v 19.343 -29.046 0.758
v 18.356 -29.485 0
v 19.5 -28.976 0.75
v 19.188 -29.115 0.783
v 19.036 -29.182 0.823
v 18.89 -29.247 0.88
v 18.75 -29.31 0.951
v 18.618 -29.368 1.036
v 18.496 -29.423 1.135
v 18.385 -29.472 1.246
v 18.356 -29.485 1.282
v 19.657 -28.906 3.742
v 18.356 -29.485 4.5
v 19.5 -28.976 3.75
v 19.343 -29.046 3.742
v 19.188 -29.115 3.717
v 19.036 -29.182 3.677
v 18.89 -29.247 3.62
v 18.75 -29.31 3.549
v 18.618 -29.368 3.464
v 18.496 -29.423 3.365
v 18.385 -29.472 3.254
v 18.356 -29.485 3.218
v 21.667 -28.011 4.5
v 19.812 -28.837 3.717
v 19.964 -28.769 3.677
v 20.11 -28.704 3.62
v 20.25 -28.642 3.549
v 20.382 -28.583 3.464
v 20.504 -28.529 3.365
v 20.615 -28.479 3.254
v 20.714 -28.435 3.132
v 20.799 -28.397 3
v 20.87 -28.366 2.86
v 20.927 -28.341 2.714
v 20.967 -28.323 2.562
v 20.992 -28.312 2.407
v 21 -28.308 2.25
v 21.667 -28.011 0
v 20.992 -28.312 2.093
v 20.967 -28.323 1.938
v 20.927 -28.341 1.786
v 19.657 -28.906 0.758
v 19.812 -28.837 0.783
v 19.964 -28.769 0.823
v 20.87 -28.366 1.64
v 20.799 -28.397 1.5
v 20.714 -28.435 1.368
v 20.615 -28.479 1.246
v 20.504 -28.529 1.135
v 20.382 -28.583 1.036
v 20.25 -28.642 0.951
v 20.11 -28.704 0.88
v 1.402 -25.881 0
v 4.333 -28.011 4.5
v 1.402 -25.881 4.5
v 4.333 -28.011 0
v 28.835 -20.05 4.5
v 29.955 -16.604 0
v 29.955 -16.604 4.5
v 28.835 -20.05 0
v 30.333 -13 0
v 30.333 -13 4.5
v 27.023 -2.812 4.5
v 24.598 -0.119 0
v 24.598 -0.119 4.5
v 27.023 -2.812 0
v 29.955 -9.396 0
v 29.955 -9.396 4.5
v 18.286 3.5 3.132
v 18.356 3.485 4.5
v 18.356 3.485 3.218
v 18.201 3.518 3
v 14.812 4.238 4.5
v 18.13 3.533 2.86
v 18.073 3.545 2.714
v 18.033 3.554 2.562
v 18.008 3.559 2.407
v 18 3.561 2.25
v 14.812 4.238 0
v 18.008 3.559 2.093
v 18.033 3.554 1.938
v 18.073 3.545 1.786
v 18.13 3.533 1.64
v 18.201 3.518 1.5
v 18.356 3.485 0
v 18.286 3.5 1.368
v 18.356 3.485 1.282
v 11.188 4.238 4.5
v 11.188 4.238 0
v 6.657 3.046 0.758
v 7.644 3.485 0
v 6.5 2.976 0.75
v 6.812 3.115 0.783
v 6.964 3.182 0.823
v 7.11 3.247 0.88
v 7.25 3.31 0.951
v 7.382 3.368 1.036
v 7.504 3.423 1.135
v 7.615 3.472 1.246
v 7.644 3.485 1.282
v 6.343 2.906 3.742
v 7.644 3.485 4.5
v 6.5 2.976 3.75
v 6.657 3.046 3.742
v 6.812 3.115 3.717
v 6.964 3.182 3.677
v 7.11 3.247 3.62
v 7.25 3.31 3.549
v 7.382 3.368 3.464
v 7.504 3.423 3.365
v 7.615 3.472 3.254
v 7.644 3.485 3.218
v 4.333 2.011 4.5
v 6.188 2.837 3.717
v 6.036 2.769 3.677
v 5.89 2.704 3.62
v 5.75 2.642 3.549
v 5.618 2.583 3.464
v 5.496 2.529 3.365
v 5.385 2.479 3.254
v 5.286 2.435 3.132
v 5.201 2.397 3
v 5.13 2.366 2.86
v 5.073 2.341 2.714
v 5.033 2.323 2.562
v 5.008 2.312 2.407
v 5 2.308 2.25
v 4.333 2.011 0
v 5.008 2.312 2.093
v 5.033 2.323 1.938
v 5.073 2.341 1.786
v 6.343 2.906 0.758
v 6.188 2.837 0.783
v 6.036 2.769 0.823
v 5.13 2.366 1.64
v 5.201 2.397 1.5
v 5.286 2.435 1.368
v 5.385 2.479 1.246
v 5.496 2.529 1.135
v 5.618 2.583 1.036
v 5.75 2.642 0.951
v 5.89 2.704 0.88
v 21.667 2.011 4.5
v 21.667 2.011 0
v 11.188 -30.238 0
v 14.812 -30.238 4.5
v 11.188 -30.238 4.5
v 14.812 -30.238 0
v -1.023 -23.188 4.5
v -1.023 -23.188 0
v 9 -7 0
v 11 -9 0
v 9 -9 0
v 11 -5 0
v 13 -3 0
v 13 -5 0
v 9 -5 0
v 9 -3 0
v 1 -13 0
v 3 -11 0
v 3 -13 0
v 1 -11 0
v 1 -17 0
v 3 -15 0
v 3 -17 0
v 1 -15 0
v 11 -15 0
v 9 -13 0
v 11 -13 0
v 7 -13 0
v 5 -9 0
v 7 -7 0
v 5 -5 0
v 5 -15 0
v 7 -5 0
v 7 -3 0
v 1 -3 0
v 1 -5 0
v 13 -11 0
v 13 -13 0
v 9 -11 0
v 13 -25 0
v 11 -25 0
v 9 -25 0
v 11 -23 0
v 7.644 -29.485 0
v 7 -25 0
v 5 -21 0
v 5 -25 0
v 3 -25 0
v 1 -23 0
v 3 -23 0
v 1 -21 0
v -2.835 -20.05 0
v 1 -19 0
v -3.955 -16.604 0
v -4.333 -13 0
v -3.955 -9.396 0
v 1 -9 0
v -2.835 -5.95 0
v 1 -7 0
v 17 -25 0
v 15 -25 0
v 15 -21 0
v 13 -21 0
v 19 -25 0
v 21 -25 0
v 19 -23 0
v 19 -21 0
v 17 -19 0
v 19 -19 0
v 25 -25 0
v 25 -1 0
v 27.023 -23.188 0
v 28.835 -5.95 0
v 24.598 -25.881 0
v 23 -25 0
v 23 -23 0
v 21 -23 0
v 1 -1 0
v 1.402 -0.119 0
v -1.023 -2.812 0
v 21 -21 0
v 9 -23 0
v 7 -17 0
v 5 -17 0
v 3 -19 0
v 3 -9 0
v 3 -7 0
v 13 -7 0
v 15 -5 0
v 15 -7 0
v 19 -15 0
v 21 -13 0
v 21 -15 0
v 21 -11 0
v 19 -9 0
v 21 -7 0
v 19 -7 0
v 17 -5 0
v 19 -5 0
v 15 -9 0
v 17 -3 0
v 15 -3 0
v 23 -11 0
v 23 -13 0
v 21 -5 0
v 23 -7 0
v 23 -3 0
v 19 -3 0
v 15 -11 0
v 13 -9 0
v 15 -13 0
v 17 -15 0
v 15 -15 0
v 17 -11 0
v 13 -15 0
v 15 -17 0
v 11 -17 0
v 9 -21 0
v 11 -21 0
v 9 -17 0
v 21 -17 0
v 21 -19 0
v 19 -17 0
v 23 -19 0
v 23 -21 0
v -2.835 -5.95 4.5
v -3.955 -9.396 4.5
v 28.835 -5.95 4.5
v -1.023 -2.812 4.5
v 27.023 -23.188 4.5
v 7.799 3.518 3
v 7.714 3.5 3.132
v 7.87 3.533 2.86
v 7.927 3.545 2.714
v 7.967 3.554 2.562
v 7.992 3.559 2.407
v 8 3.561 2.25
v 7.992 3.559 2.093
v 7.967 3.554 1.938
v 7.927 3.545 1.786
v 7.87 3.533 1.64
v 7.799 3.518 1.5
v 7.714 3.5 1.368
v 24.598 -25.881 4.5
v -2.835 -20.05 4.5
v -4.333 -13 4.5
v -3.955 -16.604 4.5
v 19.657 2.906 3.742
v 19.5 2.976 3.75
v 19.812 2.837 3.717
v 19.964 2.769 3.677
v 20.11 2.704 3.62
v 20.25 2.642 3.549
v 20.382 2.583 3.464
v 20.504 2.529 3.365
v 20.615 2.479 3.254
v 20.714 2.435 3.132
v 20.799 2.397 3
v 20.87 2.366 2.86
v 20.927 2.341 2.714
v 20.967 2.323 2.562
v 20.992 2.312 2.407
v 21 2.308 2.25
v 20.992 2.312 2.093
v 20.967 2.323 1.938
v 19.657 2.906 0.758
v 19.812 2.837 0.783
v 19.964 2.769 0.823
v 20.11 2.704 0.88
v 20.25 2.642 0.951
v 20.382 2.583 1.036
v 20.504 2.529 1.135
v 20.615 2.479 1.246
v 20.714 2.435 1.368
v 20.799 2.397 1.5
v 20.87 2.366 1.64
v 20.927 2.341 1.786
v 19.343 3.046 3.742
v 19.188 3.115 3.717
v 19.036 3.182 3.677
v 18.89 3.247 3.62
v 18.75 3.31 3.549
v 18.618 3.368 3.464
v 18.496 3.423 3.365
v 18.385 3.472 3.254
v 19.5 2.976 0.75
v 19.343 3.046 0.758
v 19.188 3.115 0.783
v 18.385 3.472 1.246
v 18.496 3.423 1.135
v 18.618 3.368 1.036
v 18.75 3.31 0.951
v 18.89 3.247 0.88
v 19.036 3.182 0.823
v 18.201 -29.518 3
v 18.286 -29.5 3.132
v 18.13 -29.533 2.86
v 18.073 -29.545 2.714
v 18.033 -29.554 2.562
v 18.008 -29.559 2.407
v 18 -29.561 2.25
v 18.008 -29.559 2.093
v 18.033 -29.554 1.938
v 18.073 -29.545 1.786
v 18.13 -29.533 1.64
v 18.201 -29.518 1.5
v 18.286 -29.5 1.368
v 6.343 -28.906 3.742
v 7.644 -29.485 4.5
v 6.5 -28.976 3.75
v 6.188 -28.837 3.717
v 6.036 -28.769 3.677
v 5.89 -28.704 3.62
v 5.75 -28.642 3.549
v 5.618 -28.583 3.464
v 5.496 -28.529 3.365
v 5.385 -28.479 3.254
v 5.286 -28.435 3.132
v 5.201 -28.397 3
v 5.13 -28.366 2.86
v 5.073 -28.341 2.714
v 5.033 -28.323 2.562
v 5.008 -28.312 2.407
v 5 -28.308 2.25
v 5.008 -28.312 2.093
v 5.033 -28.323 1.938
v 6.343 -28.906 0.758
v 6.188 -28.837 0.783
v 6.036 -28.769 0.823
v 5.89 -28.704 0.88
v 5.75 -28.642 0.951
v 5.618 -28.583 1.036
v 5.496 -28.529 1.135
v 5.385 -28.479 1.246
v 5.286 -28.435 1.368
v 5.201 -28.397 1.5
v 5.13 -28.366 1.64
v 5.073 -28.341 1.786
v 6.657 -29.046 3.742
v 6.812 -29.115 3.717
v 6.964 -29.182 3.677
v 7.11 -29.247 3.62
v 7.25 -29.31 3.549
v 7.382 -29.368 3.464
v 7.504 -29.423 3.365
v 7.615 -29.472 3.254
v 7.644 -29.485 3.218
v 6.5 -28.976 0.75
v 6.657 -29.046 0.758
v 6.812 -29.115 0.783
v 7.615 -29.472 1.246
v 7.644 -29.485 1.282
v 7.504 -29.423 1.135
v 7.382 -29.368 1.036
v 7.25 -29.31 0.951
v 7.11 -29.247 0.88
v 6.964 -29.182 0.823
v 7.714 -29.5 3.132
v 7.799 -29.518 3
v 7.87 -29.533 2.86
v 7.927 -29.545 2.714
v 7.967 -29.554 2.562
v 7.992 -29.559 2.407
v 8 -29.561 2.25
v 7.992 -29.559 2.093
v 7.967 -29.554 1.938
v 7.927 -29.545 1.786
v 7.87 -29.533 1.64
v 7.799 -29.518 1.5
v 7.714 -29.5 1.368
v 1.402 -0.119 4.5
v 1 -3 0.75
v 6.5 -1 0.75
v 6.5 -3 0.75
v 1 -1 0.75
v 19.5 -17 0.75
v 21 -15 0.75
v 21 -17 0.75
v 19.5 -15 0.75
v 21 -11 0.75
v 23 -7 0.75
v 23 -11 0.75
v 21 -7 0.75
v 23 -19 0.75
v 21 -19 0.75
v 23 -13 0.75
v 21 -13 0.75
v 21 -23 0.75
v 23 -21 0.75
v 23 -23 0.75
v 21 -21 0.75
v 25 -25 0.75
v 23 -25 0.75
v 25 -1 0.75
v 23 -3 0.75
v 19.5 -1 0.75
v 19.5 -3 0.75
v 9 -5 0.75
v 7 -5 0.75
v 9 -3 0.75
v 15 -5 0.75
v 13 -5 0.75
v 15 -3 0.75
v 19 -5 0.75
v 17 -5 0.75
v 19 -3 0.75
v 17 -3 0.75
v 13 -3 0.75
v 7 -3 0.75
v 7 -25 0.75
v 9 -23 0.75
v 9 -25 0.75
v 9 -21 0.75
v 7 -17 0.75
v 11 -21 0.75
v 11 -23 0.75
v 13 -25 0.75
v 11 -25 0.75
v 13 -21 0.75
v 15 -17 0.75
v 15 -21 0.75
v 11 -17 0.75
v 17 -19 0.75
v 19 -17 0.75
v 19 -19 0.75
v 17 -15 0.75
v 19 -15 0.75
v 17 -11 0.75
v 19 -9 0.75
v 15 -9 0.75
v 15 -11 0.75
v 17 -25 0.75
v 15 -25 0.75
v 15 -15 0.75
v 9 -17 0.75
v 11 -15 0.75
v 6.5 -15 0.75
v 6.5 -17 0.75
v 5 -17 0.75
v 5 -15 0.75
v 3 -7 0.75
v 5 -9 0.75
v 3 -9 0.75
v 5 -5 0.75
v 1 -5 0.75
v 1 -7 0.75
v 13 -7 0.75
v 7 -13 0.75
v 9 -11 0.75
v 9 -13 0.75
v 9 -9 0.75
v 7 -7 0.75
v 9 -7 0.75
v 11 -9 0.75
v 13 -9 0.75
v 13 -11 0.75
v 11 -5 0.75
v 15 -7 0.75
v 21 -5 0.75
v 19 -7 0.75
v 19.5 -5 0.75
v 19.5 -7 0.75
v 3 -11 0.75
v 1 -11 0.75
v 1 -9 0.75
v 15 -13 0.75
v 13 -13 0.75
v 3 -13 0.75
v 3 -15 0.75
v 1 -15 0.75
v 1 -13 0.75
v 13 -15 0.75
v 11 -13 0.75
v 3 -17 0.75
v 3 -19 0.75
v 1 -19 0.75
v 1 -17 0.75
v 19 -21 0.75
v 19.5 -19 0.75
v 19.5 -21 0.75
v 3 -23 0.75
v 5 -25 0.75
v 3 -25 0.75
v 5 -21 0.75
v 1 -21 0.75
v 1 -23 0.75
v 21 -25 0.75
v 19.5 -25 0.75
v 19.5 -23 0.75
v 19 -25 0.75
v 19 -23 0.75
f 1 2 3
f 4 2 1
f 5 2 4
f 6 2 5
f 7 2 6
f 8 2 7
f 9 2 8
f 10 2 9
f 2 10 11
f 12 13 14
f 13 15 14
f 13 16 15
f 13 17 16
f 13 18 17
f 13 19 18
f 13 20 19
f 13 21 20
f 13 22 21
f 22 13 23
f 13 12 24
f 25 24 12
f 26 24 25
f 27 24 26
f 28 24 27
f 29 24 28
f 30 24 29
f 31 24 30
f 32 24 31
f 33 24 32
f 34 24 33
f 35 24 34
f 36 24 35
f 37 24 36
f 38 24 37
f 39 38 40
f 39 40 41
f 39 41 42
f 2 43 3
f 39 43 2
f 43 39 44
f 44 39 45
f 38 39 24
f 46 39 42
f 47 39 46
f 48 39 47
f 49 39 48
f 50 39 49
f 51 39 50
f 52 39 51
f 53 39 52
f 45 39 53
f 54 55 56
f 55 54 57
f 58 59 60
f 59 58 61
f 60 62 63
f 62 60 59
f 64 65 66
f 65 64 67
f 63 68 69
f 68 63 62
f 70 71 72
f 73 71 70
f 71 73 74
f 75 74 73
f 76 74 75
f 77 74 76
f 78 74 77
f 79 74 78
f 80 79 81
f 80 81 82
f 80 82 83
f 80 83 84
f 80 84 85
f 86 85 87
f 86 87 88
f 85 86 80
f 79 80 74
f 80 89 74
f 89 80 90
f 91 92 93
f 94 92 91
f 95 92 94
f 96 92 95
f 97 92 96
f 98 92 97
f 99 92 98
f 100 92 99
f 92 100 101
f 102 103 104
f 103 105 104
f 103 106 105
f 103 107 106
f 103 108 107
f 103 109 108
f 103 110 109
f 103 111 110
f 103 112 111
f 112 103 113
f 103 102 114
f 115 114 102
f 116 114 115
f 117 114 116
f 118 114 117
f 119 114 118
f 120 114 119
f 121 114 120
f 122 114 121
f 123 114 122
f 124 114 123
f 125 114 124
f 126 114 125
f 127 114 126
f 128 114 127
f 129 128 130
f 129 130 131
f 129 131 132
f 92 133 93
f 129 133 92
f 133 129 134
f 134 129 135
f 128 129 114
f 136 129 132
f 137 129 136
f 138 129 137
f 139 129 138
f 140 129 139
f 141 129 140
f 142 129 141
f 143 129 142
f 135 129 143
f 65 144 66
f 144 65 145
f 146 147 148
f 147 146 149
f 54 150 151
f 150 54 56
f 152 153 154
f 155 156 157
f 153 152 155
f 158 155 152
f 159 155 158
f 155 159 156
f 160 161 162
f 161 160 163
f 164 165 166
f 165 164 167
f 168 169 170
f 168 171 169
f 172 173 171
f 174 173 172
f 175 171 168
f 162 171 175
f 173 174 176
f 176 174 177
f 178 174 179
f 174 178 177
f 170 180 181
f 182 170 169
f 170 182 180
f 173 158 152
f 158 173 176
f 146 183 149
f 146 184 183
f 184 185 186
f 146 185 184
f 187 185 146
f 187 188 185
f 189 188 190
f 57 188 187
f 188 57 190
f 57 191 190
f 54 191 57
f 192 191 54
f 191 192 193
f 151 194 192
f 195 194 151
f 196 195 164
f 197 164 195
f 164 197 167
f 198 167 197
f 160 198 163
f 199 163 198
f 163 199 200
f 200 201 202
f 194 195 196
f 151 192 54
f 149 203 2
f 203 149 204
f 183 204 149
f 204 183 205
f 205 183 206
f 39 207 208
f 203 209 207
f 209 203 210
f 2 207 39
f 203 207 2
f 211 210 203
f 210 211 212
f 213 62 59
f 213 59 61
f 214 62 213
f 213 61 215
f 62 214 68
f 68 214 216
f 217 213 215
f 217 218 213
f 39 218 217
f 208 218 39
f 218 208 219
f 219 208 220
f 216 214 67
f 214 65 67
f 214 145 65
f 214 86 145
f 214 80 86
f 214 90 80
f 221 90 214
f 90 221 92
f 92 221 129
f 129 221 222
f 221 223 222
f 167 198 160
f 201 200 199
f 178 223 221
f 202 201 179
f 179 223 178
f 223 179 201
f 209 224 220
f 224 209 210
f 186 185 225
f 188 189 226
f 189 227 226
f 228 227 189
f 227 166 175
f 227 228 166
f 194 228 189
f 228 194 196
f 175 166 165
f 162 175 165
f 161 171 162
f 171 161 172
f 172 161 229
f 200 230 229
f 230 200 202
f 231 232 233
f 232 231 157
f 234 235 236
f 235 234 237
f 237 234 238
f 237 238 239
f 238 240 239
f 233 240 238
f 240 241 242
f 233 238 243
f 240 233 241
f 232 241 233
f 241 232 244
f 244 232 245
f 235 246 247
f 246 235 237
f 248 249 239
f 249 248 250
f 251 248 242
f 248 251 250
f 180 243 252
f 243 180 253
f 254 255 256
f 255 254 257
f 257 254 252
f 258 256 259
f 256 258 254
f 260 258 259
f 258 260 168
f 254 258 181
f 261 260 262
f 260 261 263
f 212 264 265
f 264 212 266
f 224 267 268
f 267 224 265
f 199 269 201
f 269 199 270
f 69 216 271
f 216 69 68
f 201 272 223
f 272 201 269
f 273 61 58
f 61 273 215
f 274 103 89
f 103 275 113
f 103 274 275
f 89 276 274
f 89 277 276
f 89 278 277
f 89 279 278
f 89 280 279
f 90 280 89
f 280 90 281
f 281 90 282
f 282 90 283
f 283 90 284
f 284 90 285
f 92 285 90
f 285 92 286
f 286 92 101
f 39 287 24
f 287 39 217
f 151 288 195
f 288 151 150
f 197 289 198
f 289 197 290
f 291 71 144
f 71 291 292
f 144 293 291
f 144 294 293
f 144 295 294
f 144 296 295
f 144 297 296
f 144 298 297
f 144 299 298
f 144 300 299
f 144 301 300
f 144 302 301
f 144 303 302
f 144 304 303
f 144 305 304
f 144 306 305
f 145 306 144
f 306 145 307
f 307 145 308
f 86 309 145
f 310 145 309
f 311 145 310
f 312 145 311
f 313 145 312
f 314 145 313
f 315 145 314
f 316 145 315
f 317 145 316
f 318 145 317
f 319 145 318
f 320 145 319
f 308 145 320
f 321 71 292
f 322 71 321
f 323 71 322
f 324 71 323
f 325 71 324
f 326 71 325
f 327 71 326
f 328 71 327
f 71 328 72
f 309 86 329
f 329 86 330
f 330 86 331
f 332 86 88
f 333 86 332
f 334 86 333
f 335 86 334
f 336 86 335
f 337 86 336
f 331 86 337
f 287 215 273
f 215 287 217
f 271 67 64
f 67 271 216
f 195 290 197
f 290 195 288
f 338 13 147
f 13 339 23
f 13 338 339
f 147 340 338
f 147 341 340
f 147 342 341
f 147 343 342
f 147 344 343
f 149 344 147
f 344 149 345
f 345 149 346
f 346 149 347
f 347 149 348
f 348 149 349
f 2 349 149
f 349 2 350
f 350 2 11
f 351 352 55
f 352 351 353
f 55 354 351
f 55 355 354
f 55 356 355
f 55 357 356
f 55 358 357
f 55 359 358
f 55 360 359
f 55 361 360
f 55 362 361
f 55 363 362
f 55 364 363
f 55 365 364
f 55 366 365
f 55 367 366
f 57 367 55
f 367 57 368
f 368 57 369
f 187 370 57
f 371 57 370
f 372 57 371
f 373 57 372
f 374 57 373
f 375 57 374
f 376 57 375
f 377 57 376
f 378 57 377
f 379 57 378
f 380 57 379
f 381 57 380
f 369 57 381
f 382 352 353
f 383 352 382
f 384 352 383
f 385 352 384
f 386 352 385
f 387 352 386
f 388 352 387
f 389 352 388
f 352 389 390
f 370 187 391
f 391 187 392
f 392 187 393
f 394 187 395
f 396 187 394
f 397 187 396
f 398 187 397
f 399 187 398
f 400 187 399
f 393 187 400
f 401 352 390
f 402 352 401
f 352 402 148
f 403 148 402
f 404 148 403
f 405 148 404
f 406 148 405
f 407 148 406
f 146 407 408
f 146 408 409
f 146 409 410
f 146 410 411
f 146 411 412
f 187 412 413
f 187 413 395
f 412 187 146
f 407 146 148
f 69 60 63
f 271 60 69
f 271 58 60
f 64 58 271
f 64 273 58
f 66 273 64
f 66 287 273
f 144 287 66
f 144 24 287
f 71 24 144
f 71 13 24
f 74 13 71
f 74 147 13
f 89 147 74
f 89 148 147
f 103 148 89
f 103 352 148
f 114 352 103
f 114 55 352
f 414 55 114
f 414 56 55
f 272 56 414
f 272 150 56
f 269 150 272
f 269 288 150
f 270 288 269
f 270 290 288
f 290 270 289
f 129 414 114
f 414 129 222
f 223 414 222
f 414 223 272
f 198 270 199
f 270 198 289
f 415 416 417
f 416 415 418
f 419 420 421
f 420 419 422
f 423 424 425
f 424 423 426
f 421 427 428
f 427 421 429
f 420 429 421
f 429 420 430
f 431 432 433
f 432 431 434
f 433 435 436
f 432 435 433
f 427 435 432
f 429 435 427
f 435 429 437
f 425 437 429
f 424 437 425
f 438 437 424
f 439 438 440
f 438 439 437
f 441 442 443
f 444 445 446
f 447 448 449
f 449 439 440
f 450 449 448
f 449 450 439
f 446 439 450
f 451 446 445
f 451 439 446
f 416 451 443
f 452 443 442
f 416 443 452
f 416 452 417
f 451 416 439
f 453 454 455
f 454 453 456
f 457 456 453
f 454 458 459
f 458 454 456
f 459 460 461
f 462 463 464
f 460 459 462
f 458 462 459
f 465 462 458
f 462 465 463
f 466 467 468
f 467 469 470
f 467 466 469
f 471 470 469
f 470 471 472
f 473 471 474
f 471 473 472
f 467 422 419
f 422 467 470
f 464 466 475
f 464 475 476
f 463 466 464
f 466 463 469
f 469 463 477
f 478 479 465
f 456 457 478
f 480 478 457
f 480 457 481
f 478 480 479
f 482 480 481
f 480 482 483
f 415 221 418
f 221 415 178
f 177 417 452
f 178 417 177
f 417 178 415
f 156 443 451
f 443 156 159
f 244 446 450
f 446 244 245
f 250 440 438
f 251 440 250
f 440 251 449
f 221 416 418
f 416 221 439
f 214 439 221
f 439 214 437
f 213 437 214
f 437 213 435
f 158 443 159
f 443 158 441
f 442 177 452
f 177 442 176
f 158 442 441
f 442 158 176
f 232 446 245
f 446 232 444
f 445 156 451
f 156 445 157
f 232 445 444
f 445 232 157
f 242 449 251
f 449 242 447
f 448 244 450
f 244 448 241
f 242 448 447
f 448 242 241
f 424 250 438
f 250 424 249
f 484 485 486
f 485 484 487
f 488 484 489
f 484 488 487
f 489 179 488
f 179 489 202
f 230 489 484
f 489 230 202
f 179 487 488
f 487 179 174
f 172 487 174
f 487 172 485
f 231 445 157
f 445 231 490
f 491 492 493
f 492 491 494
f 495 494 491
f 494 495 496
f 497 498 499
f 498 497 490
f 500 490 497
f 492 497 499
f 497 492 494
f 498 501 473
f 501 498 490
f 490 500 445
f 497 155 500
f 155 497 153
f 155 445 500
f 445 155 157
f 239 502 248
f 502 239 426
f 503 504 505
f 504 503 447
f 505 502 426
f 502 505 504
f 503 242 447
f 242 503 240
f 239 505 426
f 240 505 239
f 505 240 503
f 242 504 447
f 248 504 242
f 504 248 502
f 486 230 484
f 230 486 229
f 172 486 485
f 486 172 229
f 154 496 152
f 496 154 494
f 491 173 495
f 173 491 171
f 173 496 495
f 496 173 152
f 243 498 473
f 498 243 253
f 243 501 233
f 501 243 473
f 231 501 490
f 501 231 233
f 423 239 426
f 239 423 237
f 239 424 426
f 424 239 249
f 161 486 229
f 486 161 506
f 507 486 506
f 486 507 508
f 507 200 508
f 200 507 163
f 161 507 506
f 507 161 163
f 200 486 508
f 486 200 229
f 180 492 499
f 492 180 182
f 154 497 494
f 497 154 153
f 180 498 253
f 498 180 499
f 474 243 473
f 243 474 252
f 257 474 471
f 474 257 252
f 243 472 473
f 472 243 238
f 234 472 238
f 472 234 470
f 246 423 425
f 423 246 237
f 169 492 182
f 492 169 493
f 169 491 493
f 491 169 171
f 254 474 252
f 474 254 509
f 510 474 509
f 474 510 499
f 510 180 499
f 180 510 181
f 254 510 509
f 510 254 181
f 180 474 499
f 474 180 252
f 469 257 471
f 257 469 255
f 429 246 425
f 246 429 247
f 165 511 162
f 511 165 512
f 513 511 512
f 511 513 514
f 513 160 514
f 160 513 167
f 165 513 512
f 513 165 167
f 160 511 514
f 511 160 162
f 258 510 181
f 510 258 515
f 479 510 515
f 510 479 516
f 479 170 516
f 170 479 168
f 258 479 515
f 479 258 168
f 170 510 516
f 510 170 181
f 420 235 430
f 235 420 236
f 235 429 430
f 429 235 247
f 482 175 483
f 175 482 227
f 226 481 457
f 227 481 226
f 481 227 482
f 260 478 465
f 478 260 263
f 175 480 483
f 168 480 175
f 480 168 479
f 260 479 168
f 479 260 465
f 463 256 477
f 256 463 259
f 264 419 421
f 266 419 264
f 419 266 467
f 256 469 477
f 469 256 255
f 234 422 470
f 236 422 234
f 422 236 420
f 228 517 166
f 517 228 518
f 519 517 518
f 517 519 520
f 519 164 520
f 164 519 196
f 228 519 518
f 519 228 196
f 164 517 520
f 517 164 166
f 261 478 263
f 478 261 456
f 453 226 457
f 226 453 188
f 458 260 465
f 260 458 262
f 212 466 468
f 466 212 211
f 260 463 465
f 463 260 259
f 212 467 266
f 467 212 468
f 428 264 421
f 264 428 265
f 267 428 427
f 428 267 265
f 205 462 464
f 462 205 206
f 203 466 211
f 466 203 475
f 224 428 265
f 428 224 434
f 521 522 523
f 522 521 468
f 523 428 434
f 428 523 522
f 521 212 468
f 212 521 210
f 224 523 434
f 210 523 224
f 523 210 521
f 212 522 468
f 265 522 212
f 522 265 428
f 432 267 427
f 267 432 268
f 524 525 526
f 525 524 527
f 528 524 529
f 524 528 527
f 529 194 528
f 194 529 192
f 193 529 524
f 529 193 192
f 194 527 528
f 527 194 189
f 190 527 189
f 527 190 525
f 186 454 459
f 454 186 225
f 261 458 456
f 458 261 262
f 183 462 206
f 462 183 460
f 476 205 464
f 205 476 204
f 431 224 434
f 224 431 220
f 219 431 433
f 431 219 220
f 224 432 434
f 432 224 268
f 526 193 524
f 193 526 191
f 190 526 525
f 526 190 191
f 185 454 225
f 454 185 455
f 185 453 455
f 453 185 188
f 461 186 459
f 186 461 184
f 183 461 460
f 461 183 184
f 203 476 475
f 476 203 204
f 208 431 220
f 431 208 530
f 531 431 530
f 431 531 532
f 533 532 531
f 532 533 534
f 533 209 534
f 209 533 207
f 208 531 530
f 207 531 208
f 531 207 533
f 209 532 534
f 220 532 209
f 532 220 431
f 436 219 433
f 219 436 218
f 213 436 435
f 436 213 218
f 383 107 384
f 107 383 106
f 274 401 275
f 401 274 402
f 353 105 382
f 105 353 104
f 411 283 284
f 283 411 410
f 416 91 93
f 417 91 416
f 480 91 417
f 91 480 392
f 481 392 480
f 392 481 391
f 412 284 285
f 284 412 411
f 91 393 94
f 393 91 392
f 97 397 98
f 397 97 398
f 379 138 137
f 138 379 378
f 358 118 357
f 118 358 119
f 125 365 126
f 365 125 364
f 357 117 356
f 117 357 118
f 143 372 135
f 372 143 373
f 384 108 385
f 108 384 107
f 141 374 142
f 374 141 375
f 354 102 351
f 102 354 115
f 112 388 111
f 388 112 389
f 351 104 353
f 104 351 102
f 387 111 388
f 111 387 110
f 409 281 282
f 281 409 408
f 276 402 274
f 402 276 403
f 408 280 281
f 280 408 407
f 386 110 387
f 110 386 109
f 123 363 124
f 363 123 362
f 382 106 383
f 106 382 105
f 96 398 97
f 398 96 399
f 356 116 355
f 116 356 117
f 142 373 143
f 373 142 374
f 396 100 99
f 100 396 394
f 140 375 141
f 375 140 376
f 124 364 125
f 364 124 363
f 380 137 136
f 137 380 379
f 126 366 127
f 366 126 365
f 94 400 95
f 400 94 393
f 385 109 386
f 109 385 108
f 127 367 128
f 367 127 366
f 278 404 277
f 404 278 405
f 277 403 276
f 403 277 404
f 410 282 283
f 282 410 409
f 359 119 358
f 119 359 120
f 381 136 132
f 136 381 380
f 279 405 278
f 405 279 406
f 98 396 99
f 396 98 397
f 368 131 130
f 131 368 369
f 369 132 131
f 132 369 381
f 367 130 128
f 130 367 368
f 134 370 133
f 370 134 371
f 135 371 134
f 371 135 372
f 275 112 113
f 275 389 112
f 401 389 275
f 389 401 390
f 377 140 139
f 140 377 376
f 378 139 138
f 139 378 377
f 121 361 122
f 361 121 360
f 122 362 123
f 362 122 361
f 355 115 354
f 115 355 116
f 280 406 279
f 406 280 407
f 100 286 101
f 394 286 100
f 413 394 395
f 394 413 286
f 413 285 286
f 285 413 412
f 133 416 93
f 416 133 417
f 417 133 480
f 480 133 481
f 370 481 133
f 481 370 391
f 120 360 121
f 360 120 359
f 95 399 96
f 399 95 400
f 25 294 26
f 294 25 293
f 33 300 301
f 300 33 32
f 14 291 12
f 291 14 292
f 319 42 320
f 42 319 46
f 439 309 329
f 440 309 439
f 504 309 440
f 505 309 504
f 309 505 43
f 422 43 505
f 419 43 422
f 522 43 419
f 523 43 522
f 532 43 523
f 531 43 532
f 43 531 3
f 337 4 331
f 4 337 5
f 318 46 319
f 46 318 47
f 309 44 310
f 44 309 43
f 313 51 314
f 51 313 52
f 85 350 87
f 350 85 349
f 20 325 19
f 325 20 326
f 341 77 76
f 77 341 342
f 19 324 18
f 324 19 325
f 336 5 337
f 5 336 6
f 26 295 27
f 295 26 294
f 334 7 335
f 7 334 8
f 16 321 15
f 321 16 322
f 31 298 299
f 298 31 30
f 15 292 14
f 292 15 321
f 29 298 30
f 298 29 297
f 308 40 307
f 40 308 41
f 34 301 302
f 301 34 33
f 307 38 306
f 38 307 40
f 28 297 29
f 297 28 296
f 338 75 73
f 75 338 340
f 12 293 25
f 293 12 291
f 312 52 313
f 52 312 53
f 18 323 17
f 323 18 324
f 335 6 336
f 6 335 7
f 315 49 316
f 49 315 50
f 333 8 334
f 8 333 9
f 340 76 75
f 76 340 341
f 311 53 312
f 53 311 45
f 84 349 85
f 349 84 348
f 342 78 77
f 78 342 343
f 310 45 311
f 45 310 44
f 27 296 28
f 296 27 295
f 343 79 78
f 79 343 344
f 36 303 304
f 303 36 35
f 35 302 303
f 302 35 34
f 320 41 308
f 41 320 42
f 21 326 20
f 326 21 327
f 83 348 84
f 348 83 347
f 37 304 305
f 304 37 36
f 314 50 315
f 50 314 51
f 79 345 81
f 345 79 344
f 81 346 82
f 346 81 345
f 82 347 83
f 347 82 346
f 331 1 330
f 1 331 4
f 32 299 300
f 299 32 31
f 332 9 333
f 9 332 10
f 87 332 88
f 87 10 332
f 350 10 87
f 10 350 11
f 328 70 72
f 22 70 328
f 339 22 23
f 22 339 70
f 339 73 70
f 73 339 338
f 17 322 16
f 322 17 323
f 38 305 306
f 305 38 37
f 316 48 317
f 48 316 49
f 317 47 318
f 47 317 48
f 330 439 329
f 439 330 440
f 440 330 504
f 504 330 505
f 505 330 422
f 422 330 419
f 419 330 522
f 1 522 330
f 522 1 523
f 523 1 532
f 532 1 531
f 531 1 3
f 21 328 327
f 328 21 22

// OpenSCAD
rotate([180,0,0])difference(){translate([13,13,-2.25])  cylinder(r=17.3333333333333,h=4.5, center=true);
translate([2,2,0])  cube(size = [2,2,1.5], center=true);
translate([4,2,0])  cube(size = [2,2,1.5], center=true);
translate([6,2,0])  cube(size = [2,2,1.5], center=true);
translate([8,2,0])  cube(size = [2,2,1.5], center=true);
translate([10,2,0])  cube(size = [2,2,1.5], center=true);
translate([12,2,0])  cube(size = [2,2,1.5], center=true);
translate([14,2,0])  cube(size = [2,2,1.5], center=true);
translate([16,2,0])  cube(size = [2,2,1.5], center=true);
translate([18,2,0])  cube(size = [2,2,1.5], center=true);
translate([20,2,0])  cube(size = [2,2,1.5], center=true);
translate([22,2,0])  cube(size = [2,2,1.5], center=true);
translate([24,2,0])  cube(size = [2,2,1.5], center=true);
translate([24,2,0])  cube(size = [2,2,1.5], center=true);
translate([24,2,0])  cube(size = [2,2,1.5], center=true);
translate([24,2,0])  cube(size = [2,2,1.5], center=true);
translate([8,4,0])  cube(size = [2,2,1.5], center=true);
translate([8,4,0])  cube(size = [2,2,1.5], center=true);
translate([8,4,0])  cube(size = [2,2,1.5], center=true);
translate([14,4,0])  cube(size = [2,2,1.5], center=true);
translate([14,4,0])  cube(size = [2,2,1.5], center=true);
translate([18,4,0])  cube(size = [2,2,1.5], center=true);
translate([18,4,0])  cube(size = [2,2,1.5], center=true);
translate([18,4,0])  cube(size = [2,2,1.5], center=true);
translate([24,4,0])  cube(size = [2,2,1.5], center=true);
translate([2,6,0])  cube(size = [2,2,1.5], center=true);
translate([4,6,0])  cube(size = [2,2,1.5], center=true);
translate([4,6,0])  cube(size = [2,2,1.5], center=true);
translate([4,6,0])  cube(size = [2,2,1.5], center=true);
translate([4,6,0])  cube(size = [2,2,1.5], center=true);
translate([12,6,0])  cube(size = [2,2,1.5], center=true);
translate([12,6,0])  cube(size = [2,2,1.5], center=true);
translate([12,6,0])  cube(size = [2,2,1.5], center=true);
translate([12,6,0])  cube(size = [2,2,1.5], center=true);
translate([20,6,0])  cube(size = [2,2,1.5], center=true);
translate([20,6,0])  cube(size = [2,2,1.5], center=true);
translate([24,6,0])  cube(size = [2,2,1.5], center=true);
translate([24,6,0])  cube(size = [2,2,1.5], center=true);
translate([4,8,0])  cube(size = [2,2,1.5], center=true);
translate([4,8,0])  cube(size = [2,2,1.5], center=true);
translate([8,8,0])  cube(size = [2,2,1.5], center=true);
translate([8,8,0])  cube(size = [2,2,1.5], center=true);
translate([12,8,0])  cube(size = [2,2,1.5], center=true);
translate([14,8,0])  cube(size = [2,2,1.5], center=true);
translate([14,8,0])  cube(size = [2,2,1.5], center=true);
translate([14,8,0])  cube(size = [2,2,1.5], center=true);
translate([14,8,0])  cube(size = [2,2,1.5], center=true);
translate([22,8,0])  cube(size = [2,2,1.5], center=true);
translate([24,8,0])  cube(size = [2,2,1.5], center=true);
translate([2,10,0])  cube(size = [2,2,1.5], center=true);
translate([2,10,0])  cube(size = [2,2,1.5], center=true);
translate([2,10,0])  cube(size = [2,2,1.5], center=true);
translate([8,10,0])  cube(size = [2,2,1.5], center=true);
translate([10,10,0])  cube(size = [2,2,1.5], center=true);
translate([12,10,0])  cube(size = [2,2,1.5], center=true);
translate([12,10,0])  cube(size = [2,2,1.5], center=true);
translate([16,10,0])  cube(size = [2,2,1.5], center=true);
translate([18,10,0])  cube(size = [2,2,1.5], center=true);
translate([18,10,0])  cube(size = [2,2,1.5], center=true);
translate([22,10,0])  cube(size = [2,2,1.5], center=true);
translate([24,10,0])  cube(size = [2,2,1.5], center=true);
translate([24,10,0])  cube(size = [2,2,1.5], center=true);
translate([24,10,0])  cube(size = [2,2,1.5], center=true);
translate([24,10,0])  cube(size = [2,2,1.5], center=true);
translate([8,12,0])  cube(size = [2,2,1.5], center=true);
translate([8,12,0])  cube(size = [2,2,1.5], center=true);
translate([8,12,0])  cube(size = [2,2,1.5], center=true);
translate([14,12,0])  cube(size = [2,2,1.5], center=true);
translate([14,12,0])  cube(size = [2,2,1.5], center=true);
translate([18,12,0])  cube(size = [2,2,1.5], center=true);
translate([18,12,0])  cube(size = [2,2,1.5], center=true);
translate([18,12,0])  cube(size = [2,2,1.5], center=true);
translate([24,12,0])  cube(size = [2,2,1.5], center=true);
translate([2,14,0])  cube(size = [2,2,1.5], center=true);
translate([2,14,0])  cube(size = [2,2,1.5], center=true);
translate([2,14,0])  cube(size = [2,2,1.5], center=true);
translate([2,14,0])  cube(size = [2,2,1.5], center=true);
translate([2,14,0])  cube(size = [2,2,1.5], center=true);
translate([12,14,0])  cube(size = [2,2,1.5], center=true);
translate([12,14,0])  cube(size = [2,2,1.5], center=true);
translate([12,14,0])  cube(size = [2,2,1.5], center=true);
translate([18,14,0])  cube(size = [2,2,1.5], center=true);
translate([18,14,0])  cube(size = [2,2,1.5], center=true);
translate([22,14,0])  cube(size = [2,2,1.5], center=true);
translate([24,14,0])  cube(size = [2,2,1.5], center=true);
translate([24,14,0])  cube(size = [2,2,1.5], center=true);
translate([24,14,0])  cube(size = [2,2,1.5], center=true);
translate([6,16,0])  cube(size = [2,2,1.5], center=true);
translate([8,16,0])  cube(size = [2,2,1.5], center=true);
translate([10,16,0])  cube(size = [2,2,1.5], center=true);
translate([10,16,0])  cube(size = [2,2,1.5], center=true);
translate([10,16,0])  cube(size = [2,2,1.5], center=true);
translate([16,16,0])  cube(size = [2,2,1.5], center=true);
translate([18,16,0])  cube(size = [2,2,1.5], center=true);
translate([20,16,0])  cube(size = [2,2,1.5], center=true);
translate([22,16,0])  cube(size = [2,2,1.5], center=true);
translate([24,16,0])  cube(size = [2,2,1.5], center=true);
translate([2,18,0])  cube(size = [2,2,1.5], center=true);
translate([2,18,0])  cube(size = [2,2,1.5], center=true);
translate([2,18,0])  cube(size = [2,2,1.5], center=true);
translate([8,18,0])  cube(size = [2,2,1.5], center=true);
translate([8,18,0])  cube(size = [2,2,1.5], center=true);
translate([12,18,0])  cube(size = [2,2,1.5], center=true);
translate([14,18,0])  cube(size = [2,2,1.5], center=true);
translate([16,18,0])  cube(size = [2,2,1.5], center=true);
translate([18,18,0])  cube(size = [2,2,1.5], center=true);
translate([18,18,0])  cube(size = [2,2,1.5], center=true);
translate([22,18,0])  cube(size = [2,2,1.5], center=true);
translate([24,18,0])  cube(size = [2,2,1.5], center=true);
translate([24,18,0])  cube(size = [2,2,1.5], center=true);
translate([24,18,0])  cube(size = [2,2,1.5], center=true);
translate([24,18,0])  cube(size = [2,2,1.5], center=true);
translate([8,20,0])  cube(size = [2,2,1.5], center=true);
translate([8,20,0])  cube(size = [2,2,1.5], center=true);
translate([12,20,0])  cube(size = [2,2,1.5], center=true);
translate([14,20,0])  cube(size = [2,2,1.5], center=true);
translate([16,20,0])  cube(size = [2,2,1.5], center=true);
translate([16,20,0])  cube(size = [2,2,1.5], center=true);
translate([20,20,0])  cube(size = [2,2,1.5], center=true);
translate([20,20,0])  cube(size = [2,2,1.5], center=true);
translate([24,20,0])  cube(size = [2,2,1.5], center=true);
translate([2,22,0])  cube(size = [2,2,1.5], center=true);
translate([4,22,0])  cube(size = [2,2,1.5], center=true);
translate([4,22,0])  cube(size = [2,2,1.5], center=true);
translate([8,22,0])  cube(size = [2,2,1.5], center=true);
translate([10,22,0])  cube(size = [2,2,1.5], center=true);
translate([12,22,0])  cube(size = [2,2,1.5], center=true);
translate([12,22,0])  cube(size = [2,2,1.5], center=true);
translate([16,22,0])  cube(size = [2,2,1.5], center=true);
translate([16,22,0])  cube(size = [2,2,1.5], center=true);
translate([16,22,0])  cube(size = [2,2,1.5], center=true);
translate([22,22,0])  cube(size = [2,2,1.5], center=true);
translate([24,22,0])  cube(size = [2,2,1.5], center=true);
translate([24,22,0])  cube(size = [2,2,1.5], center=true);
translate([4,24,0])  cube(size = [2,2,1.5], center=true);
translate([4,24,0])  cube(size = [2,2,1.5], center=true);
translate([8,24,0])  cube(size = [2,2,1.5], center=true);
translate([8,24,0])  cube(size = [2,2,1.5], center=true);
translate([12,24,0])  cube(size = [2,2,1.5], center=true);
translate([12,24,0])  cube(size = [2,2,1.5], center=true);
translate([16,24,0])  cube(size = [2,2,1.5], center=true);
translate([16,24,0])  cube(size = [2,2,1.5], center=true);
translate([20,24,0])  cube(size = [2,2,1.5], center=true);
translate([20,24,0])  cube(size = [2,2,1.5], center=true);
translate([24,24,0])  cube(size = [2,2,1.5], center=true);
rotate([90,90,0])translate([2.25,6.5,0])  cylinder(r=1.5,h=400, $fn=60, center=true);
rotate([90,90,0])translate([2.25,19.5,0])  cylinder(r=1.5,h=400, $fn=60, center=true);
}
